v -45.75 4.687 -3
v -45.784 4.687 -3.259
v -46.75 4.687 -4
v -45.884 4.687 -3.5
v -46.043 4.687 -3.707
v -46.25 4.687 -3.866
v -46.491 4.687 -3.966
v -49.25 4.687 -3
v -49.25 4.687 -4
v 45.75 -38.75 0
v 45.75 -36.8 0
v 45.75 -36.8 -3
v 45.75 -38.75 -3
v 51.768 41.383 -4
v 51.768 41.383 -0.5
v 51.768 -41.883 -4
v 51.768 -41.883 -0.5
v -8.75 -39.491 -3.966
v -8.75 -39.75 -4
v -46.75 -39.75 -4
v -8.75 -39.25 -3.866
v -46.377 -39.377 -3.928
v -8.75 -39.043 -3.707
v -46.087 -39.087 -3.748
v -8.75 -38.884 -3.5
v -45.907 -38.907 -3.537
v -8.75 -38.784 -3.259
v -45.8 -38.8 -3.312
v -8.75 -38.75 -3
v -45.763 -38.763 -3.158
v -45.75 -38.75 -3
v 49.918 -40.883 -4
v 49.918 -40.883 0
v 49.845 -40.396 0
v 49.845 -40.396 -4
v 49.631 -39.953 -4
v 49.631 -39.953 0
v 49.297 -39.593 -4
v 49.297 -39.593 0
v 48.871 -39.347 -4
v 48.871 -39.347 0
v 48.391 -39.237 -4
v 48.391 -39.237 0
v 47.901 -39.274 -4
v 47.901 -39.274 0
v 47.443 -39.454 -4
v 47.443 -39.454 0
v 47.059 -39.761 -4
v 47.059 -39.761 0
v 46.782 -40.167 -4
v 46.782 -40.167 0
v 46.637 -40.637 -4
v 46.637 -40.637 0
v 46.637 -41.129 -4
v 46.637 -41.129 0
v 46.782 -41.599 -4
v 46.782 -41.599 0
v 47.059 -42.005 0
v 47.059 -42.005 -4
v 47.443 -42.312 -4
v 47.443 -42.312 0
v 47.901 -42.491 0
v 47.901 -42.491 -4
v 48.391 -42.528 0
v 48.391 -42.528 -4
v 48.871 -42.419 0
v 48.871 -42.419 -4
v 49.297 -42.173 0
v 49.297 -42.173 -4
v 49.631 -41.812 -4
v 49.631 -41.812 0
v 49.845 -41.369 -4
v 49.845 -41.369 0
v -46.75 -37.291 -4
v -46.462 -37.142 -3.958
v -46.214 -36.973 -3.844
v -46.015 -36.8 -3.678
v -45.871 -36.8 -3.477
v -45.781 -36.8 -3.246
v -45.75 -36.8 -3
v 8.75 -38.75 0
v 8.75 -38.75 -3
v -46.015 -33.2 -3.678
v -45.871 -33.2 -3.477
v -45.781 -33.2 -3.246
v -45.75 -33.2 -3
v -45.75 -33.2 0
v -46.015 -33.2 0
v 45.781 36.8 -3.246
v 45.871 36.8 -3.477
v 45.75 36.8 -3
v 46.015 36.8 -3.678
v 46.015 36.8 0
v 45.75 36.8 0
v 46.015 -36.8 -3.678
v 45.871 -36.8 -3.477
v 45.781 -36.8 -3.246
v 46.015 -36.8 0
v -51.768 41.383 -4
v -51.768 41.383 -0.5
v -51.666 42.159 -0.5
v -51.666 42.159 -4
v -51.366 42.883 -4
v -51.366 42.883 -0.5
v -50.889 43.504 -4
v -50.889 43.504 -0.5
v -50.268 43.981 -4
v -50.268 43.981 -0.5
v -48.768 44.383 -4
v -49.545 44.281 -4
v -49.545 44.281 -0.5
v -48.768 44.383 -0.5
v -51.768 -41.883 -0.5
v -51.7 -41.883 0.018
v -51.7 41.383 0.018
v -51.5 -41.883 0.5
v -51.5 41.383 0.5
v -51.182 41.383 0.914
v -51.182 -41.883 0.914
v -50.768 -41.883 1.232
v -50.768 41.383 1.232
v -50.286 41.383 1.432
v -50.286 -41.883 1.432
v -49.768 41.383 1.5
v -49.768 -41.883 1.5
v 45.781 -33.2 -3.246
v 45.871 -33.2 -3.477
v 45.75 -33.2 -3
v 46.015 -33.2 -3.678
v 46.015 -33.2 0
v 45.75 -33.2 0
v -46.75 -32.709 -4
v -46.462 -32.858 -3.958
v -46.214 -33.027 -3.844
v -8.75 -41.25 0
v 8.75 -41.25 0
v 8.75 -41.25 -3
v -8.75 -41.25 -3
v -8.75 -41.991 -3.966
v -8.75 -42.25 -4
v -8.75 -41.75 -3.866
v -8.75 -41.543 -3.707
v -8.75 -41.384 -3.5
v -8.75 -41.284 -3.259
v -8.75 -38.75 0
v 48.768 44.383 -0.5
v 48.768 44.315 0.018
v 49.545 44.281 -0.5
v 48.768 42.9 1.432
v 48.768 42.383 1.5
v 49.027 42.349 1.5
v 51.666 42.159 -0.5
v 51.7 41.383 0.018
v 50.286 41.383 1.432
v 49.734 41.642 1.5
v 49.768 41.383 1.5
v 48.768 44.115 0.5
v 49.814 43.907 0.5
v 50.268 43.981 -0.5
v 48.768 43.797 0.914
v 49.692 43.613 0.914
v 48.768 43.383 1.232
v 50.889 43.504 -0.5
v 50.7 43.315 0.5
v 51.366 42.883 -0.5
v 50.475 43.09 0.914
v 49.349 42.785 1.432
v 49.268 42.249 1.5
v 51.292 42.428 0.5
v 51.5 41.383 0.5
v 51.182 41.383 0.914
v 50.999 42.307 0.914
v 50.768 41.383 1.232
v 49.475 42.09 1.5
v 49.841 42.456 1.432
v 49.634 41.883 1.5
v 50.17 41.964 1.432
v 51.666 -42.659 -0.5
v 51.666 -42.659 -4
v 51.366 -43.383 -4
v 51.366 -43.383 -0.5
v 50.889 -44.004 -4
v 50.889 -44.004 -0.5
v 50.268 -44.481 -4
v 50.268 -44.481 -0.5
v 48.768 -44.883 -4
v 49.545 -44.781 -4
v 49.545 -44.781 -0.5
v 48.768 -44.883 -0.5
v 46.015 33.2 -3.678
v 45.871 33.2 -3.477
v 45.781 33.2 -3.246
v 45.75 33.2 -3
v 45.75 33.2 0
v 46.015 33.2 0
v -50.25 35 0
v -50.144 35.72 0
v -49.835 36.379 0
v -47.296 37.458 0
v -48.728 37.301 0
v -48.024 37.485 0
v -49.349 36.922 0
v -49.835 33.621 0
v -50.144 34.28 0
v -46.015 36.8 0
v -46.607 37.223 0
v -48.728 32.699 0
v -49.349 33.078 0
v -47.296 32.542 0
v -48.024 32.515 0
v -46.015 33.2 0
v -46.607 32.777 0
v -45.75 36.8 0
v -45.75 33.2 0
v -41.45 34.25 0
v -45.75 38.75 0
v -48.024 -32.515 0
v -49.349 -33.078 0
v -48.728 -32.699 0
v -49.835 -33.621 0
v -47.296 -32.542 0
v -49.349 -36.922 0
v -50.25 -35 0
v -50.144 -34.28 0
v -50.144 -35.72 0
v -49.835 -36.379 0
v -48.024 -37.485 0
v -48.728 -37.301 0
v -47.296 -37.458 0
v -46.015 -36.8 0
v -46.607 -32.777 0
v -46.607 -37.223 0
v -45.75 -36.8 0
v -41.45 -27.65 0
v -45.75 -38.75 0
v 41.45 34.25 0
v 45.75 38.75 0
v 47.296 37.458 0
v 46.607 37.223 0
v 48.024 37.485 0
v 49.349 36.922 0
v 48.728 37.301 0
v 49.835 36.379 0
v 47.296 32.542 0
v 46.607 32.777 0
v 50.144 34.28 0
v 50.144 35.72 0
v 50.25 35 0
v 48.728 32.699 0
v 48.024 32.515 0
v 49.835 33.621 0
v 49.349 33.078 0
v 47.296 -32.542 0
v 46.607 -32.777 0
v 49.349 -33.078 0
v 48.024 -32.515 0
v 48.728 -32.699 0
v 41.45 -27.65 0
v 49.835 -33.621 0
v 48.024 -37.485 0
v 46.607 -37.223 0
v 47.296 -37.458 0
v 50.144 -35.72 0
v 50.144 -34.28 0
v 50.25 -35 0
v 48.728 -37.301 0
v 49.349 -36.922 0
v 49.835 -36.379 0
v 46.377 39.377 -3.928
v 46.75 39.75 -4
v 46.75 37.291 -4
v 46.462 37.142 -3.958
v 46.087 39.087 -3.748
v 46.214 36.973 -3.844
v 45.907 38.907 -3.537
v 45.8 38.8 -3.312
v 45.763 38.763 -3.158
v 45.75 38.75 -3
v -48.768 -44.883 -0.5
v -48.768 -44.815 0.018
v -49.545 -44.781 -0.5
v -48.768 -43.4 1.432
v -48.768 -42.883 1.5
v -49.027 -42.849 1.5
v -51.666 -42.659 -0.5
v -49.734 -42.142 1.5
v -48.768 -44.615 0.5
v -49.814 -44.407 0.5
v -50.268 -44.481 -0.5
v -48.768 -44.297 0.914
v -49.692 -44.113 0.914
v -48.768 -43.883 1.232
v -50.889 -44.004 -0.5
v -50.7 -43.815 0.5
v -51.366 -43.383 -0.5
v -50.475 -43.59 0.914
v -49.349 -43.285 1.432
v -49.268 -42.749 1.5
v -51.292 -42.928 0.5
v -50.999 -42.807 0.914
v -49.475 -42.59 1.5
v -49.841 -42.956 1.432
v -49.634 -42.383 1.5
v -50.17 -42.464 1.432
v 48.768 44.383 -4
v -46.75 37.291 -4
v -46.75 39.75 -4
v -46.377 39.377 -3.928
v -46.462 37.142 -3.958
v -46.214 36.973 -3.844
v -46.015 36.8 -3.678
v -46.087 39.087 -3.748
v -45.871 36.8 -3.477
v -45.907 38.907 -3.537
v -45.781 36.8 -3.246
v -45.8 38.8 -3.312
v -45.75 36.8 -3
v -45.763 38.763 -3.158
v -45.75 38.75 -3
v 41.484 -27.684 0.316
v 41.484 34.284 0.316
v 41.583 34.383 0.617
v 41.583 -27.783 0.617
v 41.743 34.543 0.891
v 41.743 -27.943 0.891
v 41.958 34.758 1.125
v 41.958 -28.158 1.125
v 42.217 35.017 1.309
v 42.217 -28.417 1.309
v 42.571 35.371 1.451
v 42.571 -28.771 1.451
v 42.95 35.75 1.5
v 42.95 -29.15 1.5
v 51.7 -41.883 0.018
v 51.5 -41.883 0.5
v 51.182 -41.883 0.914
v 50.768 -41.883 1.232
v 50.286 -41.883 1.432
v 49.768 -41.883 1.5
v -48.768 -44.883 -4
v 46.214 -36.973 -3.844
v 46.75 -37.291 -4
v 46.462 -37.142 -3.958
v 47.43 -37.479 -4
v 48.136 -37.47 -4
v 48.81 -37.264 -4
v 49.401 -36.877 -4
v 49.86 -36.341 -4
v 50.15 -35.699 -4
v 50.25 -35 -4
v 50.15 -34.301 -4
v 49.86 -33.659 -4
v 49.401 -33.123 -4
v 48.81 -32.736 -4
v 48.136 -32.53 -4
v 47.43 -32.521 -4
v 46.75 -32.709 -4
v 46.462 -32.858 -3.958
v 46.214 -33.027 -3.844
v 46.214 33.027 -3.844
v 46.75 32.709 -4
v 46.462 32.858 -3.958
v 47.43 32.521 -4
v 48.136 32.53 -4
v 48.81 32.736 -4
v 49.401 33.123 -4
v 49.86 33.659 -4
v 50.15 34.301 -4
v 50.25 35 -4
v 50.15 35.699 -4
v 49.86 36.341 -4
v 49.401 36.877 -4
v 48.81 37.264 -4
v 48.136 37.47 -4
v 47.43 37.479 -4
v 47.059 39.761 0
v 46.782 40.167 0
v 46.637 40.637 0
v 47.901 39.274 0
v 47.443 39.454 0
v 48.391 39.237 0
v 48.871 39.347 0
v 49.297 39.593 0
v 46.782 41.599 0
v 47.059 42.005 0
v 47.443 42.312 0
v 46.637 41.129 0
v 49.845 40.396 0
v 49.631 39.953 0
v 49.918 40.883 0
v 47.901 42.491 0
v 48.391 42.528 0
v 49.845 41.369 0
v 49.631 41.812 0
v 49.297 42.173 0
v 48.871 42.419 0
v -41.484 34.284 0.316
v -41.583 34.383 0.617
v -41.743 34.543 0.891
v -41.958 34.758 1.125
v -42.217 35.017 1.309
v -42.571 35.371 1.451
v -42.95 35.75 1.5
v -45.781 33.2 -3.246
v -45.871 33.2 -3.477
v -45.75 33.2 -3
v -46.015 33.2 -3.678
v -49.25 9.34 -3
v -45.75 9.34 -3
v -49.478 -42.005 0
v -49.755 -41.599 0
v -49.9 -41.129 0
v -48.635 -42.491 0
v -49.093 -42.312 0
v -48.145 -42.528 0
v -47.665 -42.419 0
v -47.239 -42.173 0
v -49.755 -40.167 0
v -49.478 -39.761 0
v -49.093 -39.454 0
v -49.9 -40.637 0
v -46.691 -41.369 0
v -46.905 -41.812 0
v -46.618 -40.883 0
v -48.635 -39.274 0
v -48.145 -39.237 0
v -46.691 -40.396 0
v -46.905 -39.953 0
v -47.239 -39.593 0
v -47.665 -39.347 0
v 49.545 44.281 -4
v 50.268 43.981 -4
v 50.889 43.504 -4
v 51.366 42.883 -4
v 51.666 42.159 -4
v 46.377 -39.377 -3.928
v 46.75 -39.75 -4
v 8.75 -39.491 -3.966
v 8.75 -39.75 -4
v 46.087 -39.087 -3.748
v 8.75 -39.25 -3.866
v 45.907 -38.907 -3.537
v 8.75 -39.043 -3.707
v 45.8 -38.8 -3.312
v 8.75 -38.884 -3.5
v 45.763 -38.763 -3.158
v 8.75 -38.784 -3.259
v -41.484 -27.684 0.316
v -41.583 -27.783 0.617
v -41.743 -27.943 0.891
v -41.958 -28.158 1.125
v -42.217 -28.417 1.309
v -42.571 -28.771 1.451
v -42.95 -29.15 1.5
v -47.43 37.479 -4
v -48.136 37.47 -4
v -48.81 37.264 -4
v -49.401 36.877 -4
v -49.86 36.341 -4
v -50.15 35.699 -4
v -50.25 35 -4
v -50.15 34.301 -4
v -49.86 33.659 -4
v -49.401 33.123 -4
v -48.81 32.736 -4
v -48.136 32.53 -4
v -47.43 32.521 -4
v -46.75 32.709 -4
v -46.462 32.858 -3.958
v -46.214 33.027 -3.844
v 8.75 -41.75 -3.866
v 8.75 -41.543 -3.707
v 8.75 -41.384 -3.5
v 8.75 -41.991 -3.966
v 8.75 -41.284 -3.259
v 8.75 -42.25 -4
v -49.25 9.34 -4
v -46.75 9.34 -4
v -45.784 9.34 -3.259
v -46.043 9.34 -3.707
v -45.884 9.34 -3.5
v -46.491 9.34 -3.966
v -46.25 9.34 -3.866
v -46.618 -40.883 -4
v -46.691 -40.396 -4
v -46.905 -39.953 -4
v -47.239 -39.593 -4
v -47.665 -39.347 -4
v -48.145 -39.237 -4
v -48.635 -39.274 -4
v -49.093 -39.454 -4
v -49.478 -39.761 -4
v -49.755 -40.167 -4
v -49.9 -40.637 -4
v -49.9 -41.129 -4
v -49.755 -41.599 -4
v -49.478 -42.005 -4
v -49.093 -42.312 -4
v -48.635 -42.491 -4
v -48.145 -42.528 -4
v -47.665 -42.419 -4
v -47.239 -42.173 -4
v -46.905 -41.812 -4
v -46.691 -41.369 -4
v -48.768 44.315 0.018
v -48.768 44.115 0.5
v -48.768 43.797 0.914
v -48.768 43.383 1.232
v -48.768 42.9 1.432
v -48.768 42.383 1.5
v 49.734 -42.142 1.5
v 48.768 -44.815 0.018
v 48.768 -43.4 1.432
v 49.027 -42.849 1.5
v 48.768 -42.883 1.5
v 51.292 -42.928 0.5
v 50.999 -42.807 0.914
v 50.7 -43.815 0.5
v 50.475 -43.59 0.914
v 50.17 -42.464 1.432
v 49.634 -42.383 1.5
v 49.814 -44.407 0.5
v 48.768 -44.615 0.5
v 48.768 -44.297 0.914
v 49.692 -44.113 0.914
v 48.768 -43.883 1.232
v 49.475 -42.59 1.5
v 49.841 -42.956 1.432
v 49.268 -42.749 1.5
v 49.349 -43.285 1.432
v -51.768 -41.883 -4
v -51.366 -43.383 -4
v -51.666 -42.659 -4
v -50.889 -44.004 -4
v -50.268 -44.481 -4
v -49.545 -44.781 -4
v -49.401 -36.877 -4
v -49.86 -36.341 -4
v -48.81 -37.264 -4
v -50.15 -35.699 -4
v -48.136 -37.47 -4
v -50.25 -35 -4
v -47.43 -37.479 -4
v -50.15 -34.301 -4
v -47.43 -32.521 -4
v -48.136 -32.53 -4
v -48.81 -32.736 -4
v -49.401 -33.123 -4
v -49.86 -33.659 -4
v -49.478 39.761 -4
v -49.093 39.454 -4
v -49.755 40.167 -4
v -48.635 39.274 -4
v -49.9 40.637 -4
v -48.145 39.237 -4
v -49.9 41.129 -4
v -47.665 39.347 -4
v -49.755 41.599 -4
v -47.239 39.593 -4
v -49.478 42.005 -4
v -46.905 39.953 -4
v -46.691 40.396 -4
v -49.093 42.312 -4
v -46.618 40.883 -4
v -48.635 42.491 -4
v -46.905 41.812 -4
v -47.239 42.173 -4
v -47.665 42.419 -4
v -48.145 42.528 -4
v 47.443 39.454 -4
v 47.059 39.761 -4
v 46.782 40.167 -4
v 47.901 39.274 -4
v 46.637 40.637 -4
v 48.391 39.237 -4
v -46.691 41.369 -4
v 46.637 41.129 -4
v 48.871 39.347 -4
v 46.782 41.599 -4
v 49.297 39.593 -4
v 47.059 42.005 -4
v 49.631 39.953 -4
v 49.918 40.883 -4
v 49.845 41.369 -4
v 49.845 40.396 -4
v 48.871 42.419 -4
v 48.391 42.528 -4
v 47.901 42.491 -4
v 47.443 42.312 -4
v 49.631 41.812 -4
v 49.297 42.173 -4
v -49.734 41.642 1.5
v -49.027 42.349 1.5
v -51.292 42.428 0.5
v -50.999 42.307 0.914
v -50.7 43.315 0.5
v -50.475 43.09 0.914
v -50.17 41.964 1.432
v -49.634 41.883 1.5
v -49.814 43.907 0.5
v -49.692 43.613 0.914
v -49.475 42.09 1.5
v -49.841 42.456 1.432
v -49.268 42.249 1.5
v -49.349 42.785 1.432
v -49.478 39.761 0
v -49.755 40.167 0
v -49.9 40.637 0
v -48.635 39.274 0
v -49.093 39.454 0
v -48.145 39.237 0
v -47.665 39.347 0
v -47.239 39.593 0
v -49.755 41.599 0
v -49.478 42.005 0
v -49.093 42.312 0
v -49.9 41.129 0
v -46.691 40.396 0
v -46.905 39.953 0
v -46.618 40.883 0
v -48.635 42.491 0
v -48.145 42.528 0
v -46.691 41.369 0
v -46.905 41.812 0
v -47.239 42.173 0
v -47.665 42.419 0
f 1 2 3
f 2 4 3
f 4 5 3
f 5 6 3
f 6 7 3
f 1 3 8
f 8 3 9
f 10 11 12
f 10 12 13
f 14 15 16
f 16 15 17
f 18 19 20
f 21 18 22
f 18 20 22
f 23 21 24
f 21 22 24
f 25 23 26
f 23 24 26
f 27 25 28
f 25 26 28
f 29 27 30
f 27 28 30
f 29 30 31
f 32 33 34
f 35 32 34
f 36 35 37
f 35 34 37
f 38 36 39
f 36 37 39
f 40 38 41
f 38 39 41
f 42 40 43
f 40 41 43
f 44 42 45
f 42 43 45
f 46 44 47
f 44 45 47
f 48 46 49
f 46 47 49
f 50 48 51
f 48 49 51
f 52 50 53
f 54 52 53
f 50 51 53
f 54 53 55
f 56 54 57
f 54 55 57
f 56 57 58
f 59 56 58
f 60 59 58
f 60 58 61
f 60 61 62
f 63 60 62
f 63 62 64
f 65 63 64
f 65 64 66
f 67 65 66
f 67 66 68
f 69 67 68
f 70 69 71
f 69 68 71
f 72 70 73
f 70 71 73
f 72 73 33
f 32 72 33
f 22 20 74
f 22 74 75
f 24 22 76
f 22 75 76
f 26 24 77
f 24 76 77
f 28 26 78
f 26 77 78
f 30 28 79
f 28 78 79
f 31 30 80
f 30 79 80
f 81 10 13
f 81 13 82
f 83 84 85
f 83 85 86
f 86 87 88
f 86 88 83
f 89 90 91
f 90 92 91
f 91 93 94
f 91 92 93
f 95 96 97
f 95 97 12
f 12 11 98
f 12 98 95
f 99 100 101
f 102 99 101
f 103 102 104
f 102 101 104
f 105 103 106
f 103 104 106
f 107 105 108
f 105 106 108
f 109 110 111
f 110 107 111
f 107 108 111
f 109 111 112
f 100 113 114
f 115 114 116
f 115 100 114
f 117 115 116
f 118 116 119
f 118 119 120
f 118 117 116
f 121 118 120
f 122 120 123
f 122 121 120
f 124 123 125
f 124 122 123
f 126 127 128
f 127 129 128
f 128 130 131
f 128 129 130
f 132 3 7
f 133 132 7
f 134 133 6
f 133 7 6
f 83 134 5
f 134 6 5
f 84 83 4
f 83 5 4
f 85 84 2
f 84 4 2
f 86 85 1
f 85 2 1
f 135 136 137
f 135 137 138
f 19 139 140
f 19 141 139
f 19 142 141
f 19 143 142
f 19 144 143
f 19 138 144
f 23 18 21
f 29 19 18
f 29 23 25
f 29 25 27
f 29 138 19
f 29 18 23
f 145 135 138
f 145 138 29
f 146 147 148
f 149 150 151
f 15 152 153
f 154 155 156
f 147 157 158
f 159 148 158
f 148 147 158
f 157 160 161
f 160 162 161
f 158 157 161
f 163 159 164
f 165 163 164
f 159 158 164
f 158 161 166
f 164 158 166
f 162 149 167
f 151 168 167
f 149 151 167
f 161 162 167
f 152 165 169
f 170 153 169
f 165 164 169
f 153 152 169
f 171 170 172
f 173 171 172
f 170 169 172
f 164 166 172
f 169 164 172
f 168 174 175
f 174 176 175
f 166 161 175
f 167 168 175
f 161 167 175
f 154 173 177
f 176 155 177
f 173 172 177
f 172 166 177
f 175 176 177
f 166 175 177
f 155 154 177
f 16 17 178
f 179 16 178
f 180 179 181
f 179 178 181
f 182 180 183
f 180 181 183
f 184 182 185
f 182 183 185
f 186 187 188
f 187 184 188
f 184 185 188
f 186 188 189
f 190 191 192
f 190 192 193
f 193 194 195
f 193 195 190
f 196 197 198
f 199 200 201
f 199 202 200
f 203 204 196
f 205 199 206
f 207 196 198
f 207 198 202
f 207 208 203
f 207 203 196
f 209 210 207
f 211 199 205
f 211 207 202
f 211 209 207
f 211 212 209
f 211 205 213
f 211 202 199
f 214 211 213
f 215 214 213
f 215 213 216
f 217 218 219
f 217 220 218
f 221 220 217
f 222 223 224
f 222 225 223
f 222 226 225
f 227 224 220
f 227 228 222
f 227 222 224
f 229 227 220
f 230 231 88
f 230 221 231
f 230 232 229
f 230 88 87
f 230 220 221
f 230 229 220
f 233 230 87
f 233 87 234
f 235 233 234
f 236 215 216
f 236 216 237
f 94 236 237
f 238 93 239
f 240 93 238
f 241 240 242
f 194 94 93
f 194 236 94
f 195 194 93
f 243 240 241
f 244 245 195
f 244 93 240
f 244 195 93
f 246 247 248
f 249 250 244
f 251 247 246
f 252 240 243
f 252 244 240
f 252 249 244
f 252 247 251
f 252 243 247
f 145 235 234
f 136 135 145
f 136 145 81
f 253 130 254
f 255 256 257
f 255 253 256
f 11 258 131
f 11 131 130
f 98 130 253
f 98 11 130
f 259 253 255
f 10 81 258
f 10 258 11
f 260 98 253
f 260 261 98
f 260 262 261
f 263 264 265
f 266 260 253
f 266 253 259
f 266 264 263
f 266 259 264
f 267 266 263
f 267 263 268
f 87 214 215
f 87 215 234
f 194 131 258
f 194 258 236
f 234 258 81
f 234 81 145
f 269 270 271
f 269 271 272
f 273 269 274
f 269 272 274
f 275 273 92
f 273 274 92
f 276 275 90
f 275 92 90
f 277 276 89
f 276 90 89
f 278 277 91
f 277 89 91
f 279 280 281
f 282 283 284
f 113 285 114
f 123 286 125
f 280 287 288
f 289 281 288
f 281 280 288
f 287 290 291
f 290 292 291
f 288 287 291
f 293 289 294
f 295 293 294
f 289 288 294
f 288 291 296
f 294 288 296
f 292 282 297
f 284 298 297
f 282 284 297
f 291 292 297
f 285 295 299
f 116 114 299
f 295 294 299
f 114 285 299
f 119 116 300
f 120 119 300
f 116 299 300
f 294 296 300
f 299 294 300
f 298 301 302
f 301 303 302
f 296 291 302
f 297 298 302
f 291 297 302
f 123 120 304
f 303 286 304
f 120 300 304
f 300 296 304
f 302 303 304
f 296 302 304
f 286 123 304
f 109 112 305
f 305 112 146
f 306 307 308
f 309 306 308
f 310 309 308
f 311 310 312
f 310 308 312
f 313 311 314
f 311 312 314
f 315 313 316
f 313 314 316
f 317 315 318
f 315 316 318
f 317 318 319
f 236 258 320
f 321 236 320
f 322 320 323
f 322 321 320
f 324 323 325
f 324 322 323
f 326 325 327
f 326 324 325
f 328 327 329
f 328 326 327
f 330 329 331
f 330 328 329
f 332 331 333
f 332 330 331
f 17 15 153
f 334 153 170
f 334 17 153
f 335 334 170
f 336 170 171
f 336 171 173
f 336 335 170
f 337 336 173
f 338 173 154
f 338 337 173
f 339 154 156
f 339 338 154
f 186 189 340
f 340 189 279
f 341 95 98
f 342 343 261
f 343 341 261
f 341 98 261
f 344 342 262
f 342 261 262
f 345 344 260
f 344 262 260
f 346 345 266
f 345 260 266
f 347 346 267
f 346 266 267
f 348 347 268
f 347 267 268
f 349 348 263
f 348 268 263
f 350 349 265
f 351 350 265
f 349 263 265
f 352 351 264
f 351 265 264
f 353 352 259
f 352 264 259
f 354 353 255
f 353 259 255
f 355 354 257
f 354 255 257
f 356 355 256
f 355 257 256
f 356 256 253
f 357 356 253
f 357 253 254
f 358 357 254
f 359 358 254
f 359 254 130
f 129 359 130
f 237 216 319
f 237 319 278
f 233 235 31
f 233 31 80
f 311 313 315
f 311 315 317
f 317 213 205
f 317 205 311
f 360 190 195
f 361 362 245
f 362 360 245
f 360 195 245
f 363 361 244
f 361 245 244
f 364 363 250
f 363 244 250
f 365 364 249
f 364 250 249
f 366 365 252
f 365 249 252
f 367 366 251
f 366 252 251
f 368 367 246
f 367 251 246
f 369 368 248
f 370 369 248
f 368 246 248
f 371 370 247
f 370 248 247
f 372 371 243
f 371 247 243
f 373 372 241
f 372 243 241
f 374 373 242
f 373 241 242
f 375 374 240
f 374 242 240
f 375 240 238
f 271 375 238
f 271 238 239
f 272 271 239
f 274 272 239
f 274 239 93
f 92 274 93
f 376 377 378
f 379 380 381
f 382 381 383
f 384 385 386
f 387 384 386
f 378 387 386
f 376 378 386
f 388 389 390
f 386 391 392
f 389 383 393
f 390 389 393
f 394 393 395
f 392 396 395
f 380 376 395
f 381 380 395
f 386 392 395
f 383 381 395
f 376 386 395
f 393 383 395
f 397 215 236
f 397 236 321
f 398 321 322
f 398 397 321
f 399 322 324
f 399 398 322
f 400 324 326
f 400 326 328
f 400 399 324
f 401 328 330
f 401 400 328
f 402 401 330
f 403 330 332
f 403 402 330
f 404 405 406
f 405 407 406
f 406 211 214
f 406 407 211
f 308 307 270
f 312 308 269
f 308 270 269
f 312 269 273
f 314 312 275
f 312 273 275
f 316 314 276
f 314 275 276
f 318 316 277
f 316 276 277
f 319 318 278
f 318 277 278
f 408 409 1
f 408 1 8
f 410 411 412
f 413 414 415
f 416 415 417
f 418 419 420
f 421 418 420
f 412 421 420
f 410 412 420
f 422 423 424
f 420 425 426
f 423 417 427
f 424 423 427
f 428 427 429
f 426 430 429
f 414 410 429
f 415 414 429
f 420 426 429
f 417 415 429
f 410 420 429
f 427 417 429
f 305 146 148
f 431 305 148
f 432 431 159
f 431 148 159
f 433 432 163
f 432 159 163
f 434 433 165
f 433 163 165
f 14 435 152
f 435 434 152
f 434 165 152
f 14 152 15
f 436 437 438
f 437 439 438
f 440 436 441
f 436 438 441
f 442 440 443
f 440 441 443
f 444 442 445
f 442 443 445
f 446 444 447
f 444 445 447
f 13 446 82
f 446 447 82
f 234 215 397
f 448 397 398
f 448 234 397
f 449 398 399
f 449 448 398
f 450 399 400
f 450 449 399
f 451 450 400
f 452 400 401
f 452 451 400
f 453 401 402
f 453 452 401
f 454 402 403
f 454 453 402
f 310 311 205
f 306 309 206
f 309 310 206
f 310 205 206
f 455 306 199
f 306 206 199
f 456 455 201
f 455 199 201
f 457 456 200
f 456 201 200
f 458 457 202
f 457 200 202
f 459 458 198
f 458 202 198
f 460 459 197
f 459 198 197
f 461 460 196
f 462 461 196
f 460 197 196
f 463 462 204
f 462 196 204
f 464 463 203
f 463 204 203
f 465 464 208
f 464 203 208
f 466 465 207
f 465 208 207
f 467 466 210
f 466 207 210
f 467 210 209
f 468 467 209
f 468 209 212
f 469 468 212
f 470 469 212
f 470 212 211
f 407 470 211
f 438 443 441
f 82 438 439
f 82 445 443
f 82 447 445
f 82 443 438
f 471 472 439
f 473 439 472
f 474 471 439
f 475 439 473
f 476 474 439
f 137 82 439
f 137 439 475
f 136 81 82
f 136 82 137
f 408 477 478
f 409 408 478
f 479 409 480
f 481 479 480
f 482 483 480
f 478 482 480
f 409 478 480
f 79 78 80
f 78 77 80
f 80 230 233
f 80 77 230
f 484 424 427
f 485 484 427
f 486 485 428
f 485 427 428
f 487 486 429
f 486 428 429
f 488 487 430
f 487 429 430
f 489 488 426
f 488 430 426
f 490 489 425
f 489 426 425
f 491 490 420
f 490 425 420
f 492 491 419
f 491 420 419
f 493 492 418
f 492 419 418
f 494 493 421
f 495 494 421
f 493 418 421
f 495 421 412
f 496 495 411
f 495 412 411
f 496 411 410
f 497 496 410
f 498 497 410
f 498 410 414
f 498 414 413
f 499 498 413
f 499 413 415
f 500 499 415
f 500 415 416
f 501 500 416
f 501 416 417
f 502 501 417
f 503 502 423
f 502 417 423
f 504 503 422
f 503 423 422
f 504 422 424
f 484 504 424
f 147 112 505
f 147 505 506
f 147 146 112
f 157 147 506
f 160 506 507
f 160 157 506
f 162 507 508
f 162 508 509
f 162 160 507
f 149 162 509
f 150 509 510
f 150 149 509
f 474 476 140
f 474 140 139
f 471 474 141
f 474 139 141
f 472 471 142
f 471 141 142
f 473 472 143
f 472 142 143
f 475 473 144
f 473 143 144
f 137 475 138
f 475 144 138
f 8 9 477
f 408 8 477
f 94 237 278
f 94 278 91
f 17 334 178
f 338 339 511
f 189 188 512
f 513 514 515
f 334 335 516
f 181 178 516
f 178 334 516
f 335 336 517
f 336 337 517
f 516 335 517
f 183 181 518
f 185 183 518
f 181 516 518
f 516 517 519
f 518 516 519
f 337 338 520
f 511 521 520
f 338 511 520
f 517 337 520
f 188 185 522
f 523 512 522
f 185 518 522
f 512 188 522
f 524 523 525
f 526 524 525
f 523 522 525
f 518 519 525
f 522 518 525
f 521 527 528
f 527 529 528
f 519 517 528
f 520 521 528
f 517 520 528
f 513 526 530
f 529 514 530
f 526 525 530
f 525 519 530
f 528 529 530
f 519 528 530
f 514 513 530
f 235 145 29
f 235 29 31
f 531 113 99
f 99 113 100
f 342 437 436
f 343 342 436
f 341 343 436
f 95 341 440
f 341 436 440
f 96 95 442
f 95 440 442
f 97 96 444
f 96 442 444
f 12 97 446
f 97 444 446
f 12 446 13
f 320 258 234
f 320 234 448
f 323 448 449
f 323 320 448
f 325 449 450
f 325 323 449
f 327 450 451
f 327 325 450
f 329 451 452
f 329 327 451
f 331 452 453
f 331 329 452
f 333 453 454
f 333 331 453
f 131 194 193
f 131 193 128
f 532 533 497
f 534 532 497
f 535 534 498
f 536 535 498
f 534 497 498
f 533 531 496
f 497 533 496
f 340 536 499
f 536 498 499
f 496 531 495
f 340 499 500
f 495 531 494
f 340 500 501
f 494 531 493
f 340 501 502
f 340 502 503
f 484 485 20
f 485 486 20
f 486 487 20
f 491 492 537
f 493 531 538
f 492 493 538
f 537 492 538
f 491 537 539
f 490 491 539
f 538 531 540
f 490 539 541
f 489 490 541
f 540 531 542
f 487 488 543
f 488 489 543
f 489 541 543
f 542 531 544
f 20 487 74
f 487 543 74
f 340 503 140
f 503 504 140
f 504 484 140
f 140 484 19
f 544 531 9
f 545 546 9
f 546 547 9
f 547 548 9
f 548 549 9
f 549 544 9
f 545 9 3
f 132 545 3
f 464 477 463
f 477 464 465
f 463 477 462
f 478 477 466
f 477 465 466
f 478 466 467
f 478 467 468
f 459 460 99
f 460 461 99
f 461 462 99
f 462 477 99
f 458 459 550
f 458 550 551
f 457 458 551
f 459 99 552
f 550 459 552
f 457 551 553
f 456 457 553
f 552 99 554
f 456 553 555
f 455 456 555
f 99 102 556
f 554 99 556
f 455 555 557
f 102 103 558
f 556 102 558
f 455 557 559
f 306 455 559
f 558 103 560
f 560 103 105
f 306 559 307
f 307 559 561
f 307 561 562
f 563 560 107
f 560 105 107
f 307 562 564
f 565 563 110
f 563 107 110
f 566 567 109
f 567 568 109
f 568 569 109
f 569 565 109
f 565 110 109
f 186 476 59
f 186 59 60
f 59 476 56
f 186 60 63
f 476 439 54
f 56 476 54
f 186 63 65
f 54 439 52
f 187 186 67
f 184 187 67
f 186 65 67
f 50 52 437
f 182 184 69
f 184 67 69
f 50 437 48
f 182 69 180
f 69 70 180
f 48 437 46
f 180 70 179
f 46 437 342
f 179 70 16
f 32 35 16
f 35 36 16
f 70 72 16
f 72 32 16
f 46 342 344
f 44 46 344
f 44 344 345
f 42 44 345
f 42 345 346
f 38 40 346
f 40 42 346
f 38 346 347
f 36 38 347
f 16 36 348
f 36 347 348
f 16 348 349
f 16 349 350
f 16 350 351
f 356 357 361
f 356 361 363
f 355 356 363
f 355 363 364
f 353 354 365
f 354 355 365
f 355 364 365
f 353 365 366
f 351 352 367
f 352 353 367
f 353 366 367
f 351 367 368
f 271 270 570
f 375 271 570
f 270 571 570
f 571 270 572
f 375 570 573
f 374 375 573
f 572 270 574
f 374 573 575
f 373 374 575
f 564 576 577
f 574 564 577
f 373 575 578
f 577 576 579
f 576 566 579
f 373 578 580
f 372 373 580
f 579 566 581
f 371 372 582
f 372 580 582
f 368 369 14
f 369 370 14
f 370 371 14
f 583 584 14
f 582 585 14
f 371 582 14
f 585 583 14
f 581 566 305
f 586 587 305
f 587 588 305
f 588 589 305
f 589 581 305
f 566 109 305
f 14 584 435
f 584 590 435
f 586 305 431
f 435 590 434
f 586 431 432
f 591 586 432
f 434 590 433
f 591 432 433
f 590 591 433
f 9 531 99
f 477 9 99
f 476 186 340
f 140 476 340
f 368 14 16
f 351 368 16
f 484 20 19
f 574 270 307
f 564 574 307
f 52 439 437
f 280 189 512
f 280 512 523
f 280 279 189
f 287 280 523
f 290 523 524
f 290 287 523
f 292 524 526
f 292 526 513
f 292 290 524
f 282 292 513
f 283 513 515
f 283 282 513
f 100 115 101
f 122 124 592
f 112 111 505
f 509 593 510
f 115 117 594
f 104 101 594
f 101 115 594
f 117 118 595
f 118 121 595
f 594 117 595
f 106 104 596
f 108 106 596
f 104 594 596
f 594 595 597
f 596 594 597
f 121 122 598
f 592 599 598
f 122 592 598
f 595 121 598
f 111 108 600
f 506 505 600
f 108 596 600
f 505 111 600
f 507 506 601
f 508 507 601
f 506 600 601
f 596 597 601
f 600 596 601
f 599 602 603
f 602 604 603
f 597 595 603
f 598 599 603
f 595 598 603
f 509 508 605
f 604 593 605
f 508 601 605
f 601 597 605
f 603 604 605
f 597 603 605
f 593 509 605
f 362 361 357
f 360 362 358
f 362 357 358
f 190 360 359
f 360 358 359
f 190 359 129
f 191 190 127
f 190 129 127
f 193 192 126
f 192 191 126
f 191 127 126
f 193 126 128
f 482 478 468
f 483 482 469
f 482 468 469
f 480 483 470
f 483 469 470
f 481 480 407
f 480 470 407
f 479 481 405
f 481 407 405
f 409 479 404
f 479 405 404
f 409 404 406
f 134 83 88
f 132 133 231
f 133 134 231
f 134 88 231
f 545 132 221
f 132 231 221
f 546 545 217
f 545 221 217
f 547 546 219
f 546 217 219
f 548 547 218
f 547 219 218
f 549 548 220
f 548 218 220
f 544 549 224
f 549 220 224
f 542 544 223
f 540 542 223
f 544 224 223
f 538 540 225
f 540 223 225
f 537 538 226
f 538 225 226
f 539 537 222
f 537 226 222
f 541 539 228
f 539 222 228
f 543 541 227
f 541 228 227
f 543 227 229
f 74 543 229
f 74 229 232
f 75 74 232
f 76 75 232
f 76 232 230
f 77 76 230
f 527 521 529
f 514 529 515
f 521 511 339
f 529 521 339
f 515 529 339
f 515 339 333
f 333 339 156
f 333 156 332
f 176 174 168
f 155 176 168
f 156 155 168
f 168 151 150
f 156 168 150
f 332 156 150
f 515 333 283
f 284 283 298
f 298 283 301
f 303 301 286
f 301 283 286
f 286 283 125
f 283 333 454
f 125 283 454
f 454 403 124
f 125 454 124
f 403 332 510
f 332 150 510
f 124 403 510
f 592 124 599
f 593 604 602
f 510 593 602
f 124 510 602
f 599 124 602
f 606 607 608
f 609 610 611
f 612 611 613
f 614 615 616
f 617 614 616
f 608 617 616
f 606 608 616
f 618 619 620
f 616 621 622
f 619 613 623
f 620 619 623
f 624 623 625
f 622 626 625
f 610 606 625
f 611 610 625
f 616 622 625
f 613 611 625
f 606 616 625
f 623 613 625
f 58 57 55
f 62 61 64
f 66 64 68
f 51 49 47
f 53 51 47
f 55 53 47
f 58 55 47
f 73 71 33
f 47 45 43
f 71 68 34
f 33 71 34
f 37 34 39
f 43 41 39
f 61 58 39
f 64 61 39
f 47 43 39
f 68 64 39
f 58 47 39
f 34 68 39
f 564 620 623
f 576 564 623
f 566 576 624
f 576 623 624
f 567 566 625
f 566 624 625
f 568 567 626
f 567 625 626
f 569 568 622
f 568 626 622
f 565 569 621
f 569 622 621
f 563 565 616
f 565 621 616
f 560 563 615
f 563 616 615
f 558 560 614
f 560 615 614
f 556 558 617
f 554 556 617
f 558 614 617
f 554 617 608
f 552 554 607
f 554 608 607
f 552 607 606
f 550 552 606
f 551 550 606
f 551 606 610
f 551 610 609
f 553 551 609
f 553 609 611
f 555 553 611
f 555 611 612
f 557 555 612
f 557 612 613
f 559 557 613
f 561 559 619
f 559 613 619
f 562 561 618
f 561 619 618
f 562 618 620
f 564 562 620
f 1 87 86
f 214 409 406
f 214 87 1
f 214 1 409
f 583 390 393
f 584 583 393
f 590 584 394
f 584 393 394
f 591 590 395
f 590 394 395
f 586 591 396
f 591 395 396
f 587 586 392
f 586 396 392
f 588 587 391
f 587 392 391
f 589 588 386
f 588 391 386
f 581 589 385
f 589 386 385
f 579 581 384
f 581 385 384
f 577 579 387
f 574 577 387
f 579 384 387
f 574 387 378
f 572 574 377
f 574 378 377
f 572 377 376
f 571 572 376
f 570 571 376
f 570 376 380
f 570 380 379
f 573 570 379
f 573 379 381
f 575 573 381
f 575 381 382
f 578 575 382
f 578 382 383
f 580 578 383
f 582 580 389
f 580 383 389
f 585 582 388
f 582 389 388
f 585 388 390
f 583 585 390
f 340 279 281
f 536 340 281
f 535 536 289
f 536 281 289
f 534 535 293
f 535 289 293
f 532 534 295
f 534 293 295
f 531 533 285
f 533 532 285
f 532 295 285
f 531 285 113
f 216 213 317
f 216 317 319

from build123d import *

# Parameters (mm, degrees)
SKETCH_1_R          = 1.65
EXTRUDE_1_DEPTH     = 4
EXTRUDE_START       = 1.5
SKETCH_1_3_R        = 1.65
SKETCH_1_3_W        = 91.5
SKETCH_1_3_H        = 77.5
SKETCH_1_3_W_2      = 85.9
SKETCH_1_3_H_2      = 64.9
SKETCH_1_3_W_3      = 17.5
SKETCH_1_3_H_3      = 2.5
EXTRUDE_2_DEPTH     = 1.5
FILLET_1_R          = 2
FILLET_2_R          = 1
CUT_EXTRUDE_START   = -4
CUT_EXTRUDE_1_DEPTH = 4
SKETCH_5_W          = 2.5
SKETCH_5_H          = 4.652730878
SKETCH_5_W_2        = 1
CUT_EXTRUDE_2_DEPTH = 1


with BuildPart() as part:
    # 草图1 → 凸台-拉伸1 (new body)
    with BuildSketch(Plane.XY):
        with BuildLine():
            Line((48.768130557, 44.382842821), (-48.768130557, 44.382842821))
            ThreePointArc((-48.768130557, 44.382842821), (-50.8894509, 43.504163165), (-51.768130557, 41.382842821))
            Line((-51.768130557, 41.382842821), (-51.768130557, -41.882842821))
            ThreePointArc((-51.768130557, -41.882842821), (-50.8894509, -44.004163165), (-48.768130557, -44.882842821))
            Line((-48.768130557, -44.882842821), (48.768130557, -44.882842821))
            ThreePointArc((48.768130557, -44.882842821), (50.8894509, -44.004163165), (51.768130557, -41.882842821))
            Line((51.768130557, -41.882842821), (51.768130557, 41.382842821))
            ThreePointArc((51.768130557, 41.382842821), (50.8894509, 43.504163165), (48.768130557, 44.382842821))
        make_face()
        with Locations((-48.268130557, -40.882842821)):
            Circle(SKETCH_1_R, mode=Mode.SUBTRACT)
        Polygon((-45.75, -38.75), (-45.75, 38.75), (45.75, 38.75), (45.75, -38.75), (8.75, -38.75), (8.75, -41.25), (-8.75, -41.25), (-8.75, -38.75), align=None, mode=Mode.SUBTRACT)
        with Locations((48.268130557, -40.882842821)):
            Circle(SKETCH_1_R, mode=Mode.SUBTRACT)
        with Locations((-48.268130557, 40.882842821)):
            Circle(SKETCH_1_R, mode=Mode.SUBTRACT)
        with Locations((48.268130557, 40.882842821)):
            Circle(SKETCH_1_R, mode=Mode.SUBTRACT)
    extrude(amount=-EXTRUDE_1_DEPTH)

    # 草图1<3> → 凸台-拉伸2 (add)
    # profile 1 of 7: a face of its own
    with BuildSketch(Plane.XY.offset(EXTRUDE_START)):
        with BuildLine():
            Line((-48.768130557, 44.382842821), (48.768130557, 44.382842821))
            ThreePointArc((48.768130557, 44.382842821), (50.8894509, 43.504163165), (51.768130557, 41.382842821))
            Line((51.768130557, 41.382842821), (51.768130557, -41.882842821))
            ThreePointArc((51.768130557, -41.882842821), (50.8894509, -44.004163165), (48.768130557, -44.882842821))
            Line((48.768130557, -44.882842821), (-48.768130557, -44.882842821))
            ThreePointArc((-48.768130557, -44.882842821), (-50.8894509, -44.004163165), (-51.768130557, -41.882842821))
            Line((-51.768130557, -41.882842821), (-51.768130557, 41.382842821))
            ThreePointArc((-51.768130557, 41.382842821), (-50.8894509, 43.504163165), (-48.768130557, 44.382842821))
        make_face()
        with Locations((48.268130557, 40.882842821)):
            Circle(SKETCH_1_3_R, mode=Mode.SUBTRACT)
        with Locations((-48.268130557, 40.882842821)):
            Circle(SKETCH_1_3_R, mode=Mode.SUBTRACT)
        with Locations((-48.268130557, -40.882842821)):
            Circle(SKETCH_1_3_R, mode=Mode.SUBTRACT)
        with Locations((48.268130557, -40.882842821)):
            Circle(SKETCH_1_3_R, mode=Mode.SUBTRACT)
        Rectangle(SKETCH_1_3_W, SKETCH_1_3_H, mode=Mode.SUBTRACT)
    # profile 2 of 7: a face of its own
    with BuildSketch(Plane.XY.offset(EXTRUDE_START)):
        with Locations((-48.268130557, -40.882842821)):
            Circle(SKETCH_1_3_R)
    # profile 3 of 7: a face of its own
    with BuildSketch(Plane.XY.offset(EXTRUDE_START)):
        with Locations((48.268130557, -40.882842821)):
            Circle(SKETCH_1_3_R)
    # profile 4 of 7: a face of its own
    with BuildSketch(Plane.XY.offset(EXTRUDE_START)):
        with Locations((48.268130557, 40.882842821)):
            Circle(SKETCH_1_3_R)
    # profile 5 of 7: a face of its own
    with BuildSketch(Plane.XY.offset(EXTRUDE_START)):
        with Locations((-48.268130557, 40.882842821)):
            Circle(SKETCH_1_3_R)
    # profile 6 of 7: a face of its own
    with BuildSketch(Plane.XY.offset(EXTRUDE_START)):
        Rectangle(SKETCH_1_3_W, SKETCH_1_3_H)
        with Locations((0, 3.3)):
            Rectangle(SKETCH_1_3_W_2, SKETCH_1_3_H_2, mode=Mode.SUBTRACT)
    # profile 7 of 7: a face of its own
    with BuildSketch(Plane.XY.offset(EXTRUDE_START)):
        with Locations((0, -40)):
            Rectangle(SKETCH_1_3_W_3, SKETCH_1_3_H_3)
    extrude(amount=-EXTRUDE_2_DEPTH)

    # 圆角1
    fillet_1_edges = [part.edges().sort_by_distance(p)[0] for p in [
        (0, 44.382842821, 1.5),
        (50.8894509, -44.004163165, 1.5),
        (51.768130557, -0.25, 1.5),
        (-50.8894509, 43.504163165, 1.5),
        (-51.768130557, -0.25, 1.5),
        (-50.8894509, -44.004163165, 1.5),
        (0, -44.882842821, 1.5),
        (50.8894509, 43.504163165, 1.5),
    ]]
    fillet(fillet_1_edges, radius=FILLET_1_R)

    # 圆角2
    fillet_2_edges = [part.edges().sort_by_distance(p)[0] for p in [
        (0, -41.25, -4),
        (-27.25, -38.75, -4),
        (-45.75, 0, -4),
        (0, 38.75, -4),
        (45.75, 0, -4),
        (27.25, -38.75, -4),
    ]]
    fillet(fillet_2_edges, radius=FILLET_2_R)

    # 草图2 → 切除-拉伸1 (cut)
    with BuildSketch(Plane(origin=(0, 0, -4), x_dir=(-1, 0, 0), z_dir=(0, 0, -1)).offset(CUT_EXTRUDE_START)):
        with BuildLine():
            Line((-46.015064843, 36.8), (-45.484935157, 36.8))
            ThreePointArc((-45.484935157, 36.8), (-41.25, 35), (-45.484935157, 33.2))
            Line((-45.484935157, 33.2), (-46.015064843, 33.2))
            ThreePointArc((-46.015064843, 33.2), (-50.25, 35), (-46.015064843, 36.8))
        make_face()
        with BuildLine():
            Line((46.015064843, 33.2), (45.484935157, 33.2))
            ThreePointArc((45.484935157, 33.2), (41.25, 35), (45.484935157, 36.8))
            Line((45.484935157, 36.8), (46.015064843, 36.8))
            ThreePointArc((46.015064843, 36.8), (50.25, 35), (46.015064843, 33.2))
        make_face()
        with BuildLine():
            Line((46.015064843, -36.8), (45.484935157, -36.8))
            ThreePointArc((45.484935157, -36.8), (41.25, -35), (45.484935157, -33.2))
            Line((45.484935157, -33.2), (46.015064843, -33.2))
            ThreePointArc((46.015064843, -33.2), (50.25, -35), (46.015064843, -36.8))
        make_face()
        with BuildLine():
            Line((-46.015064843, -33.2), (-45.484935157, -33.2))
            ThreePointArc((-45.484935157, -33.2), (-41.25, -35), (-45.484935157, -36.8))
            Line((-45.484935157, -36.8), (-46.015064843, -36.8))
            ThreePointArc((-46.015064843, -36.8), (-50.25, -35), (-46.015064843, -33.2))
        make_face()
    extrude(amount=CUT_EXTRUDE_1_DEPTH, mode=Mode.SUBTRACT)

    # 扫描1: sweep along a path in 草图3
    with BuildLine(Plane(origin=(0, 0, 0), x_dir=(-1, 0, 0), z_dir=(0, 0, -1))) as sweep_1_path:
        Line((41.45, 34.25), (41.45, -27.65))
        Line((41.45, -27.65), (-41.45, -27.65))
        Line((-41.45, -27.65), (-41.45, 34.25))
        Line((-41.45, 34.25), (41.45, 34.25))
    # 草图4 → 扫描1 (sweep)
    with BuildSketch(Plane(origin=(0, 0, 0), x_dir=(1, 0, 0), z_dir=(0, 1, 0))):
        with BuildLine():
            Line((41.45, 0), (42.95, 0))
            Line((42.95, 0), (42.95, -1.5))
            ThreePointArc((42.95, -1.5), (41.889339828, -1.060660172), (41.45, 0))
        make_face()
    sweep(path=sweep_1_path.line, transition=Transition.RIGHT)

    # 草图5 → 切除-拉伸2 (cut)
    with BuildSketch(Plane(origin=(0, 0, -4), x_dir=(-1, 0, 0), z_dir=(0, 0, -1))):
        with Locations((48, 7.013523993)):
            Rectangle(SKETCH_5_W, SKETCH_5_H)
        with Locations((46.25, 7.013523993)):
            Rectangle(SKETCH_5_W_2, SKETCH_5_H)
    extrude(amount=-CUT_EXTRUDE_2_DEPTH, mode=Mode.SUBTRACT)


solid = part.part
